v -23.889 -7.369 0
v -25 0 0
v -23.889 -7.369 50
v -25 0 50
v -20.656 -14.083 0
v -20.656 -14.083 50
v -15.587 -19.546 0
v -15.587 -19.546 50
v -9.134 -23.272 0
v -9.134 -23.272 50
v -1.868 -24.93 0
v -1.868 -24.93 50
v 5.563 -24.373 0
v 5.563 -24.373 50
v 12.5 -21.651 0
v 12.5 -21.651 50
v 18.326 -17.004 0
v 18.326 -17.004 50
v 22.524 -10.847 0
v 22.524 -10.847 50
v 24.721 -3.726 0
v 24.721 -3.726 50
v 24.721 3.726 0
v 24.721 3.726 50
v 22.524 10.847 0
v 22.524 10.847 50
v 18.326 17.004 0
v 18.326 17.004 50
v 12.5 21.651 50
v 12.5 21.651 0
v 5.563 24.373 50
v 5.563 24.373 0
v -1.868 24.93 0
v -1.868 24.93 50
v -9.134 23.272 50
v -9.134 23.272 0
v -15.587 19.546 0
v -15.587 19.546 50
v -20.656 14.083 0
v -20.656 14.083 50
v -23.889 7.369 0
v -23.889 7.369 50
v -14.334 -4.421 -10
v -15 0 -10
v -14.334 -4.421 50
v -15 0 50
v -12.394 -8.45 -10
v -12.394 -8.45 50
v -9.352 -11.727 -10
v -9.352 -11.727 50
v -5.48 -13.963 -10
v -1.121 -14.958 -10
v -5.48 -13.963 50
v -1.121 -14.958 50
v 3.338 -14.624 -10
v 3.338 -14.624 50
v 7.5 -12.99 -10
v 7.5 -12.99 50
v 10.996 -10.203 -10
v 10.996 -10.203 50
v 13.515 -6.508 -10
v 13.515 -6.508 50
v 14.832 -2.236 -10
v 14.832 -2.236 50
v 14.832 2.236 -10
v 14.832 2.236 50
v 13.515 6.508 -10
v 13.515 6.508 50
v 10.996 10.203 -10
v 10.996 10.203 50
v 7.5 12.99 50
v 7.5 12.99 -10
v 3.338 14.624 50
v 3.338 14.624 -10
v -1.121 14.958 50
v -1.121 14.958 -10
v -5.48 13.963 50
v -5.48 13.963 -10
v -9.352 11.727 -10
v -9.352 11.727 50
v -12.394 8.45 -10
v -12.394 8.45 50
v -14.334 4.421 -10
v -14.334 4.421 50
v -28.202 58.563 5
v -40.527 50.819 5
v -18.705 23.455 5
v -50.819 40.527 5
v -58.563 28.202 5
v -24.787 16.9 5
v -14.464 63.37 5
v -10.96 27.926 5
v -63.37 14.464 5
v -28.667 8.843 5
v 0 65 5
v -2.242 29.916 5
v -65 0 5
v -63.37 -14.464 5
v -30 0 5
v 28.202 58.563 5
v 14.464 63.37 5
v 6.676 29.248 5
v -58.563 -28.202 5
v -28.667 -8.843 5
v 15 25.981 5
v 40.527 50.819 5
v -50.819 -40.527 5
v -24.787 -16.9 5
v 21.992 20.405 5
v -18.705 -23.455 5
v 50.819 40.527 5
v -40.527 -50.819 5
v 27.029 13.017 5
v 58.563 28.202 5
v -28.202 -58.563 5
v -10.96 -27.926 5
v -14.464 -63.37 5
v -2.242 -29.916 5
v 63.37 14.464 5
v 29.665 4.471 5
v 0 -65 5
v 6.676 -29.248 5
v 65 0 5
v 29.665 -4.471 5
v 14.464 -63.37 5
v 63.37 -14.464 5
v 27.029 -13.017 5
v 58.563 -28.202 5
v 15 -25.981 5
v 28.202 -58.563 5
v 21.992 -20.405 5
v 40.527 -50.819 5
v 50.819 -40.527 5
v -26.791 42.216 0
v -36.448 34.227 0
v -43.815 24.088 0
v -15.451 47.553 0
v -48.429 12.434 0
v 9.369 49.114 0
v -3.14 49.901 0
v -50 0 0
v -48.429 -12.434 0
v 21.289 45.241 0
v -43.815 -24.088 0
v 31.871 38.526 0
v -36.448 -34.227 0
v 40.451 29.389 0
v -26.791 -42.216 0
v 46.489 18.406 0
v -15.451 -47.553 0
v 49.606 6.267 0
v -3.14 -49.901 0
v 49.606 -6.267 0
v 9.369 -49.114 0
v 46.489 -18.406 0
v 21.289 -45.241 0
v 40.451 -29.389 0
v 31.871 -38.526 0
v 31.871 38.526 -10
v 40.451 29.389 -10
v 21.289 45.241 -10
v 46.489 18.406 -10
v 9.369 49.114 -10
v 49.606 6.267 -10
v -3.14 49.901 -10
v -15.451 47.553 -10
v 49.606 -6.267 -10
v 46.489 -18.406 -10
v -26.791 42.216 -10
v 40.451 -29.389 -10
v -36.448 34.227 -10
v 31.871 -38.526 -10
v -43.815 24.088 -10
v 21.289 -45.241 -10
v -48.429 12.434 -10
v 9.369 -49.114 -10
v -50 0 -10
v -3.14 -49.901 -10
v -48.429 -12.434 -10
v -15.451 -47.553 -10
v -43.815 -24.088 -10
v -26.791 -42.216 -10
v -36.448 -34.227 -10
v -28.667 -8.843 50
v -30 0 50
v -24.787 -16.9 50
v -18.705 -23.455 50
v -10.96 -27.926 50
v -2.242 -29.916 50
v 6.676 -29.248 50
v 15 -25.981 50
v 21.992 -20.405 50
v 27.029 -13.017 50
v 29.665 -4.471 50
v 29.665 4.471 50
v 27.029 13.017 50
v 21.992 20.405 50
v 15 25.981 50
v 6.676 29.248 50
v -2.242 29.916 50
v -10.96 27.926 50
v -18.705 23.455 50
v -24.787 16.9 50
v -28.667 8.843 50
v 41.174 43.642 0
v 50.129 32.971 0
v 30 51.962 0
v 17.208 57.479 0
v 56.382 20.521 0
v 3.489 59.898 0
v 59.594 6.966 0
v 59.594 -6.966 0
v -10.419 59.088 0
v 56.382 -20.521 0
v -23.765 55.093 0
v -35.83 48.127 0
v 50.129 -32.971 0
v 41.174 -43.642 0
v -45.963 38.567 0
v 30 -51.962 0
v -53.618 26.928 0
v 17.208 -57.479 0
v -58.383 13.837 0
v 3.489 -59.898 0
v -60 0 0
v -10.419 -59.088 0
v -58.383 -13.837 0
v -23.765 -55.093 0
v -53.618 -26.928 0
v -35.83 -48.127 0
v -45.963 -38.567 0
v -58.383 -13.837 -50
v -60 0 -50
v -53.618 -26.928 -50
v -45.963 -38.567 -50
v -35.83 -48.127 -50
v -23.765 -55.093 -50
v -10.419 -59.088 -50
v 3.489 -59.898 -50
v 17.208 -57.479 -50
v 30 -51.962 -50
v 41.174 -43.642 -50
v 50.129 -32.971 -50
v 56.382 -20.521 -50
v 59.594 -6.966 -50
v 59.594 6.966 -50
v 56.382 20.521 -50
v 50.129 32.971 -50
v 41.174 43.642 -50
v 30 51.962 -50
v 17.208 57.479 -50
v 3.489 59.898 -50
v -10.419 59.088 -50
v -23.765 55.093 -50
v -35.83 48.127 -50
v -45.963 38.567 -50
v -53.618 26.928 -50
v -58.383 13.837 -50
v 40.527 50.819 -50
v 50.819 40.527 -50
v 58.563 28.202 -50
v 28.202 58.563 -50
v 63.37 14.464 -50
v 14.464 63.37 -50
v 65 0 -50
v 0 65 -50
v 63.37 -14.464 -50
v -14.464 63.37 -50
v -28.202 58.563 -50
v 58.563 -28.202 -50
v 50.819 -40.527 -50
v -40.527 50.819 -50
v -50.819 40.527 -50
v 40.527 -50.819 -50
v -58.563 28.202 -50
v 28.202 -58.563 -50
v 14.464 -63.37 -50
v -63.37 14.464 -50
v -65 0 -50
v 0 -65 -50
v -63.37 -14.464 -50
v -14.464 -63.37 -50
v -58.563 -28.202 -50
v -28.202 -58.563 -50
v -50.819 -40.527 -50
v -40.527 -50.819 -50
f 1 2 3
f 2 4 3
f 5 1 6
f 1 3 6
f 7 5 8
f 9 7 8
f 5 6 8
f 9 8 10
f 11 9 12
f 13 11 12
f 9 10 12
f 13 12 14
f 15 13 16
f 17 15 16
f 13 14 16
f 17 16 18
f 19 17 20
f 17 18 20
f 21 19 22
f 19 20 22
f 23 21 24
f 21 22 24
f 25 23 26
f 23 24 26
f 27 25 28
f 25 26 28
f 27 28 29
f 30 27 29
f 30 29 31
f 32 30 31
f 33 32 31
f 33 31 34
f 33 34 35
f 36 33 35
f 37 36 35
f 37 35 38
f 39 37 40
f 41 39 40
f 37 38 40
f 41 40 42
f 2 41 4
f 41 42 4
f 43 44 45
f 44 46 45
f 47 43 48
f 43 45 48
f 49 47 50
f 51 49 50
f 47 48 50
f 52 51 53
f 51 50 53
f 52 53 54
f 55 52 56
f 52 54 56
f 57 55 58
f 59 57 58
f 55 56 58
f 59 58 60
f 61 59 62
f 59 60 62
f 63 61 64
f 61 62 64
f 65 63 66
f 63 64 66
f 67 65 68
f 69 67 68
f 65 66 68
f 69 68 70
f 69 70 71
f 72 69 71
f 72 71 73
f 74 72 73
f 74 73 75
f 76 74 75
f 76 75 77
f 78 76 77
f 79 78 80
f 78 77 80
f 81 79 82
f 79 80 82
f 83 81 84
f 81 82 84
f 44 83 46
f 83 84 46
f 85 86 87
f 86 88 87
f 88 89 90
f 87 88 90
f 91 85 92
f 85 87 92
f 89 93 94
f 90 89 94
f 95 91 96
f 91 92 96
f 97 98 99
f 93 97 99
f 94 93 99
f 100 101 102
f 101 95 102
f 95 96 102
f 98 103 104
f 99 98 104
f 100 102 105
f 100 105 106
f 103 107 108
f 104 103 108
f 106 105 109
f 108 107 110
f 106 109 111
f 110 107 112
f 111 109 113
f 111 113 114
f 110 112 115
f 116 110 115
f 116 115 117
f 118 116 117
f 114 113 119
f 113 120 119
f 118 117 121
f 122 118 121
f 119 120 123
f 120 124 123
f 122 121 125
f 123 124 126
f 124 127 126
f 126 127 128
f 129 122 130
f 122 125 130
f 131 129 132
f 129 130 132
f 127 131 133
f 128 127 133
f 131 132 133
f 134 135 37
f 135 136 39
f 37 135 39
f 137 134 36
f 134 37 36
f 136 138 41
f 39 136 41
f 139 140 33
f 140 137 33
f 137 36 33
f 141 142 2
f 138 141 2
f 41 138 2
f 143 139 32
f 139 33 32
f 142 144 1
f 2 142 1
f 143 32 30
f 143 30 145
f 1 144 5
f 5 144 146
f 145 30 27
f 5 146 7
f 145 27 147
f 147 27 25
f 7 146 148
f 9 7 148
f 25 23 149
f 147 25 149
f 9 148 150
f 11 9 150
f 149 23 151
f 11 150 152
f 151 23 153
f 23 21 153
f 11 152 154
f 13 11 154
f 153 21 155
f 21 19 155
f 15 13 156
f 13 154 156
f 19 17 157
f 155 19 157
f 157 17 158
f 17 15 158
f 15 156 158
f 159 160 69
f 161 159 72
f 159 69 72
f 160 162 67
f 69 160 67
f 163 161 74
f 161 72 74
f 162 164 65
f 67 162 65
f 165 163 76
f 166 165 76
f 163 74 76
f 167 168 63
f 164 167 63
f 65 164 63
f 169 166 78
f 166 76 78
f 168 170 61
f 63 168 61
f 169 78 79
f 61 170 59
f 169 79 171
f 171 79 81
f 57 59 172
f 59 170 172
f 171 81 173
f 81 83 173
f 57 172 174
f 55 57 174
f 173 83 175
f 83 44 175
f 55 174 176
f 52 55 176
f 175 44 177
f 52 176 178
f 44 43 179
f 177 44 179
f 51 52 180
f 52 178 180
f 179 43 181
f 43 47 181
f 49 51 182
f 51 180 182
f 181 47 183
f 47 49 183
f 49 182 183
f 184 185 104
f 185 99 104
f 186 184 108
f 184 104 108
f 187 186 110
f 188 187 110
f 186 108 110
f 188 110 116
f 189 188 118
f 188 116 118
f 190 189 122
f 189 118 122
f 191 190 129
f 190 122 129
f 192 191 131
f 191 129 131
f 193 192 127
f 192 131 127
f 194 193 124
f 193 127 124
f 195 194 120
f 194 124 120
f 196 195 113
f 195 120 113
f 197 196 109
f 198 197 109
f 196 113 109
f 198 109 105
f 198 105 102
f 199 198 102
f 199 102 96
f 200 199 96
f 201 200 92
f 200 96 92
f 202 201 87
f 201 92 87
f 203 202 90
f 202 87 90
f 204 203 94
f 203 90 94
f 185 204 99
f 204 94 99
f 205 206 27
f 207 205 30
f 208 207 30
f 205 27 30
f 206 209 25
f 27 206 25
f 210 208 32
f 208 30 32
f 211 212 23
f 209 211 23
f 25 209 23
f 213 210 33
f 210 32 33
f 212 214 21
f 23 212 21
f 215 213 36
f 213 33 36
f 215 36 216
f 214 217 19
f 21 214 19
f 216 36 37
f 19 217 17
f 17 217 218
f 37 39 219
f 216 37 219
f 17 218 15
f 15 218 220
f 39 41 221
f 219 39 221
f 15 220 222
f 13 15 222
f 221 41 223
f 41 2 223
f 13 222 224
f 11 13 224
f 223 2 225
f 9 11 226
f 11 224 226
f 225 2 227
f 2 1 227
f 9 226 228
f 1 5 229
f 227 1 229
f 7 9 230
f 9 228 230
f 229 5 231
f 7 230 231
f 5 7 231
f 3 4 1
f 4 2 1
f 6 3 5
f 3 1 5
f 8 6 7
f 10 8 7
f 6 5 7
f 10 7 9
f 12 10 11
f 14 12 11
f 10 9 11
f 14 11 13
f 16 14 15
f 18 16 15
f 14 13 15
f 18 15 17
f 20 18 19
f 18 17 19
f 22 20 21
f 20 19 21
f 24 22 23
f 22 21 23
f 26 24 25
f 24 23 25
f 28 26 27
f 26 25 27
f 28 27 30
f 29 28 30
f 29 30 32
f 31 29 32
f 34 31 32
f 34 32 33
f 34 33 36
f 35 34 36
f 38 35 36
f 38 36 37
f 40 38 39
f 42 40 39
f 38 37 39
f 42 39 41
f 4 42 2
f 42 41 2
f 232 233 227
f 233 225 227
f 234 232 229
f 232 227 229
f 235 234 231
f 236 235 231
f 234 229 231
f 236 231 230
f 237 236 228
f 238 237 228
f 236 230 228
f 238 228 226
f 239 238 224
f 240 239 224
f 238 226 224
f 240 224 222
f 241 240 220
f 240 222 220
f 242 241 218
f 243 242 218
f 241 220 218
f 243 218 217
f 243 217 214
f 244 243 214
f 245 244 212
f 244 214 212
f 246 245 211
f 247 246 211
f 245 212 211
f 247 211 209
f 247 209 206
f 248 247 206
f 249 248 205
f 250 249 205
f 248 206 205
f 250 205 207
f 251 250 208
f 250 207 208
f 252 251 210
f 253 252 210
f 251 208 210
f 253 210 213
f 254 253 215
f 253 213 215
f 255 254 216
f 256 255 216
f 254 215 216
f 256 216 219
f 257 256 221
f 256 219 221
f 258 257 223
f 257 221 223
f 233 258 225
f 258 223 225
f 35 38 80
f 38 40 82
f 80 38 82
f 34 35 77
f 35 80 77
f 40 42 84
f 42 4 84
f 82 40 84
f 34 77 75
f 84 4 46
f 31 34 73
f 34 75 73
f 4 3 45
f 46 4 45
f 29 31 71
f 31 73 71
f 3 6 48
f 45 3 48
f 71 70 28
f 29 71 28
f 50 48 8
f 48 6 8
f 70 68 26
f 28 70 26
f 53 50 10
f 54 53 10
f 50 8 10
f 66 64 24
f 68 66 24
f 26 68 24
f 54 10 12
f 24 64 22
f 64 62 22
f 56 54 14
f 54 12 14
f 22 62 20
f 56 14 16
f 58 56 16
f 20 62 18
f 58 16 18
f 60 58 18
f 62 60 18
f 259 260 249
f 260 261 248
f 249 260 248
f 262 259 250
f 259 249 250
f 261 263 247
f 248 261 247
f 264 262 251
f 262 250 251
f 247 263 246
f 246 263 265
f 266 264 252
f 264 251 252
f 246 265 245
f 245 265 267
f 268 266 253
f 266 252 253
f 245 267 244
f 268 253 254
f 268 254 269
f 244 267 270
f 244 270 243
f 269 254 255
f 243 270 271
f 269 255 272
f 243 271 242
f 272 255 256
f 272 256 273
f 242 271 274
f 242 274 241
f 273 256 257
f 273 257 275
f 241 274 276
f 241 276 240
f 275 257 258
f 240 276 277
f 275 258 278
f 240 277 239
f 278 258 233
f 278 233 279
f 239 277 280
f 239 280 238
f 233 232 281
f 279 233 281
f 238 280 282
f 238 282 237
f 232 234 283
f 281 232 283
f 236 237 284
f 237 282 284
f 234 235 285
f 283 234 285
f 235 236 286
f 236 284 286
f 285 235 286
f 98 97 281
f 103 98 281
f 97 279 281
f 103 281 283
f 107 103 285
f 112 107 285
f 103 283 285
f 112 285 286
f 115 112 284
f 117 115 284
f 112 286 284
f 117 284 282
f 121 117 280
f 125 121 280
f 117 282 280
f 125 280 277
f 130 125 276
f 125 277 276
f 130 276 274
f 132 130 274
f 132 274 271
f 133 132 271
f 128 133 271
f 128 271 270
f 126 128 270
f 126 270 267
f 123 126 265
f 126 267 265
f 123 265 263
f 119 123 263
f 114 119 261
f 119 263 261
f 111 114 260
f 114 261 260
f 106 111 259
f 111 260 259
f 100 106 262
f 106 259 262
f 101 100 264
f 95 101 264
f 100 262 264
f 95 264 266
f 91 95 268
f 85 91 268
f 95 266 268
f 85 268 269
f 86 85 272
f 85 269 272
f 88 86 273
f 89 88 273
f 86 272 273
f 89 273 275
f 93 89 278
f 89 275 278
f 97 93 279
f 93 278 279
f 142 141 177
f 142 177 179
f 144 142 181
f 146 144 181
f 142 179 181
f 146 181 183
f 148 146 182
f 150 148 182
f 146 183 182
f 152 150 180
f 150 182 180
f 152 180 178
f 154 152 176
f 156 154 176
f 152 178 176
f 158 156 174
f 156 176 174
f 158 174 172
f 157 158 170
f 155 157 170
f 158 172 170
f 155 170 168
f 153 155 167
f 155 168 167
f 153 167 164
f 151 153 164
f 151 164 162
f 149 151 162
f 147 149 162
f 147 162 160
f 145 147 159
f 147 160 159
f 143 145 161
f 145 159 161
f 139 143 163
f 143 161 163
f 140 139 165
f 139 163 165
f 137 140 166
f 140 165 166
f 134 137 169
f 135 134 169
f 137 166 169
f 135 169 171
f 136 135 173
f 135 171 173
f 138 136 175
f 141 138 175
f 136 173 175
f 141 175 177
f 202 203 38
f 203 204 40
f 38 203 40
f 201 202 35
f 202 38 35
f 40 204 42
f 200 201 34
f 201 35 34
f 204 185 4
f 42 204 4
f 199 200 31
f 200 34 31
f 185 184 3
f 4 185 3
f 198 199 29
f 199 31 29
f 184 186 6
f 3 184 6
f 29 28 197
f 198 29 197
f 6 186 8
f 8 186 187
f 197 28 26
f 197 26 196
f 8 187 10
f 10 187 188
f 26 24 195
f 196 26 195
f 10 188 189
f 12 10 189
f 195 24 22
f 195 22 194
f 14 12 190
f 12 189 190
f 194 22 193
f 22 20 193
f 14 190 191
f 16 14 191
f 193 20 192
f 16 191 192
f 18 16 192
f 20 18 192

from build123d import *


with BuildPart() as f1:
    # F0 (on Front) → F1 (revolve)
    with BuildSketch(Plane.XZ):
        Polygon((-25, 50), (-30, 50), (-30, 5), (-65, 5), (-65, -50), (-60, -50), (-60, 0), (-50, 0), (-25, 0), align=None)
    revolve(axis=Axis((0, 0, 42.08643), (0, 0, 1)))


with BuildPart() as f2:
    # F0 (on Front) → F2 (revolve)
    with BuildSketch(Plane.XZ):
        Polygon((-15, 50), (-25, 50), (-25, 0), (-50, 0), (-50, -10), (-15, -10), align=None)
    revolve(axis=Axis((0, 0, 42.08643), (0, 0, 1)))


solid = Compound([f1.part, f2.part])
